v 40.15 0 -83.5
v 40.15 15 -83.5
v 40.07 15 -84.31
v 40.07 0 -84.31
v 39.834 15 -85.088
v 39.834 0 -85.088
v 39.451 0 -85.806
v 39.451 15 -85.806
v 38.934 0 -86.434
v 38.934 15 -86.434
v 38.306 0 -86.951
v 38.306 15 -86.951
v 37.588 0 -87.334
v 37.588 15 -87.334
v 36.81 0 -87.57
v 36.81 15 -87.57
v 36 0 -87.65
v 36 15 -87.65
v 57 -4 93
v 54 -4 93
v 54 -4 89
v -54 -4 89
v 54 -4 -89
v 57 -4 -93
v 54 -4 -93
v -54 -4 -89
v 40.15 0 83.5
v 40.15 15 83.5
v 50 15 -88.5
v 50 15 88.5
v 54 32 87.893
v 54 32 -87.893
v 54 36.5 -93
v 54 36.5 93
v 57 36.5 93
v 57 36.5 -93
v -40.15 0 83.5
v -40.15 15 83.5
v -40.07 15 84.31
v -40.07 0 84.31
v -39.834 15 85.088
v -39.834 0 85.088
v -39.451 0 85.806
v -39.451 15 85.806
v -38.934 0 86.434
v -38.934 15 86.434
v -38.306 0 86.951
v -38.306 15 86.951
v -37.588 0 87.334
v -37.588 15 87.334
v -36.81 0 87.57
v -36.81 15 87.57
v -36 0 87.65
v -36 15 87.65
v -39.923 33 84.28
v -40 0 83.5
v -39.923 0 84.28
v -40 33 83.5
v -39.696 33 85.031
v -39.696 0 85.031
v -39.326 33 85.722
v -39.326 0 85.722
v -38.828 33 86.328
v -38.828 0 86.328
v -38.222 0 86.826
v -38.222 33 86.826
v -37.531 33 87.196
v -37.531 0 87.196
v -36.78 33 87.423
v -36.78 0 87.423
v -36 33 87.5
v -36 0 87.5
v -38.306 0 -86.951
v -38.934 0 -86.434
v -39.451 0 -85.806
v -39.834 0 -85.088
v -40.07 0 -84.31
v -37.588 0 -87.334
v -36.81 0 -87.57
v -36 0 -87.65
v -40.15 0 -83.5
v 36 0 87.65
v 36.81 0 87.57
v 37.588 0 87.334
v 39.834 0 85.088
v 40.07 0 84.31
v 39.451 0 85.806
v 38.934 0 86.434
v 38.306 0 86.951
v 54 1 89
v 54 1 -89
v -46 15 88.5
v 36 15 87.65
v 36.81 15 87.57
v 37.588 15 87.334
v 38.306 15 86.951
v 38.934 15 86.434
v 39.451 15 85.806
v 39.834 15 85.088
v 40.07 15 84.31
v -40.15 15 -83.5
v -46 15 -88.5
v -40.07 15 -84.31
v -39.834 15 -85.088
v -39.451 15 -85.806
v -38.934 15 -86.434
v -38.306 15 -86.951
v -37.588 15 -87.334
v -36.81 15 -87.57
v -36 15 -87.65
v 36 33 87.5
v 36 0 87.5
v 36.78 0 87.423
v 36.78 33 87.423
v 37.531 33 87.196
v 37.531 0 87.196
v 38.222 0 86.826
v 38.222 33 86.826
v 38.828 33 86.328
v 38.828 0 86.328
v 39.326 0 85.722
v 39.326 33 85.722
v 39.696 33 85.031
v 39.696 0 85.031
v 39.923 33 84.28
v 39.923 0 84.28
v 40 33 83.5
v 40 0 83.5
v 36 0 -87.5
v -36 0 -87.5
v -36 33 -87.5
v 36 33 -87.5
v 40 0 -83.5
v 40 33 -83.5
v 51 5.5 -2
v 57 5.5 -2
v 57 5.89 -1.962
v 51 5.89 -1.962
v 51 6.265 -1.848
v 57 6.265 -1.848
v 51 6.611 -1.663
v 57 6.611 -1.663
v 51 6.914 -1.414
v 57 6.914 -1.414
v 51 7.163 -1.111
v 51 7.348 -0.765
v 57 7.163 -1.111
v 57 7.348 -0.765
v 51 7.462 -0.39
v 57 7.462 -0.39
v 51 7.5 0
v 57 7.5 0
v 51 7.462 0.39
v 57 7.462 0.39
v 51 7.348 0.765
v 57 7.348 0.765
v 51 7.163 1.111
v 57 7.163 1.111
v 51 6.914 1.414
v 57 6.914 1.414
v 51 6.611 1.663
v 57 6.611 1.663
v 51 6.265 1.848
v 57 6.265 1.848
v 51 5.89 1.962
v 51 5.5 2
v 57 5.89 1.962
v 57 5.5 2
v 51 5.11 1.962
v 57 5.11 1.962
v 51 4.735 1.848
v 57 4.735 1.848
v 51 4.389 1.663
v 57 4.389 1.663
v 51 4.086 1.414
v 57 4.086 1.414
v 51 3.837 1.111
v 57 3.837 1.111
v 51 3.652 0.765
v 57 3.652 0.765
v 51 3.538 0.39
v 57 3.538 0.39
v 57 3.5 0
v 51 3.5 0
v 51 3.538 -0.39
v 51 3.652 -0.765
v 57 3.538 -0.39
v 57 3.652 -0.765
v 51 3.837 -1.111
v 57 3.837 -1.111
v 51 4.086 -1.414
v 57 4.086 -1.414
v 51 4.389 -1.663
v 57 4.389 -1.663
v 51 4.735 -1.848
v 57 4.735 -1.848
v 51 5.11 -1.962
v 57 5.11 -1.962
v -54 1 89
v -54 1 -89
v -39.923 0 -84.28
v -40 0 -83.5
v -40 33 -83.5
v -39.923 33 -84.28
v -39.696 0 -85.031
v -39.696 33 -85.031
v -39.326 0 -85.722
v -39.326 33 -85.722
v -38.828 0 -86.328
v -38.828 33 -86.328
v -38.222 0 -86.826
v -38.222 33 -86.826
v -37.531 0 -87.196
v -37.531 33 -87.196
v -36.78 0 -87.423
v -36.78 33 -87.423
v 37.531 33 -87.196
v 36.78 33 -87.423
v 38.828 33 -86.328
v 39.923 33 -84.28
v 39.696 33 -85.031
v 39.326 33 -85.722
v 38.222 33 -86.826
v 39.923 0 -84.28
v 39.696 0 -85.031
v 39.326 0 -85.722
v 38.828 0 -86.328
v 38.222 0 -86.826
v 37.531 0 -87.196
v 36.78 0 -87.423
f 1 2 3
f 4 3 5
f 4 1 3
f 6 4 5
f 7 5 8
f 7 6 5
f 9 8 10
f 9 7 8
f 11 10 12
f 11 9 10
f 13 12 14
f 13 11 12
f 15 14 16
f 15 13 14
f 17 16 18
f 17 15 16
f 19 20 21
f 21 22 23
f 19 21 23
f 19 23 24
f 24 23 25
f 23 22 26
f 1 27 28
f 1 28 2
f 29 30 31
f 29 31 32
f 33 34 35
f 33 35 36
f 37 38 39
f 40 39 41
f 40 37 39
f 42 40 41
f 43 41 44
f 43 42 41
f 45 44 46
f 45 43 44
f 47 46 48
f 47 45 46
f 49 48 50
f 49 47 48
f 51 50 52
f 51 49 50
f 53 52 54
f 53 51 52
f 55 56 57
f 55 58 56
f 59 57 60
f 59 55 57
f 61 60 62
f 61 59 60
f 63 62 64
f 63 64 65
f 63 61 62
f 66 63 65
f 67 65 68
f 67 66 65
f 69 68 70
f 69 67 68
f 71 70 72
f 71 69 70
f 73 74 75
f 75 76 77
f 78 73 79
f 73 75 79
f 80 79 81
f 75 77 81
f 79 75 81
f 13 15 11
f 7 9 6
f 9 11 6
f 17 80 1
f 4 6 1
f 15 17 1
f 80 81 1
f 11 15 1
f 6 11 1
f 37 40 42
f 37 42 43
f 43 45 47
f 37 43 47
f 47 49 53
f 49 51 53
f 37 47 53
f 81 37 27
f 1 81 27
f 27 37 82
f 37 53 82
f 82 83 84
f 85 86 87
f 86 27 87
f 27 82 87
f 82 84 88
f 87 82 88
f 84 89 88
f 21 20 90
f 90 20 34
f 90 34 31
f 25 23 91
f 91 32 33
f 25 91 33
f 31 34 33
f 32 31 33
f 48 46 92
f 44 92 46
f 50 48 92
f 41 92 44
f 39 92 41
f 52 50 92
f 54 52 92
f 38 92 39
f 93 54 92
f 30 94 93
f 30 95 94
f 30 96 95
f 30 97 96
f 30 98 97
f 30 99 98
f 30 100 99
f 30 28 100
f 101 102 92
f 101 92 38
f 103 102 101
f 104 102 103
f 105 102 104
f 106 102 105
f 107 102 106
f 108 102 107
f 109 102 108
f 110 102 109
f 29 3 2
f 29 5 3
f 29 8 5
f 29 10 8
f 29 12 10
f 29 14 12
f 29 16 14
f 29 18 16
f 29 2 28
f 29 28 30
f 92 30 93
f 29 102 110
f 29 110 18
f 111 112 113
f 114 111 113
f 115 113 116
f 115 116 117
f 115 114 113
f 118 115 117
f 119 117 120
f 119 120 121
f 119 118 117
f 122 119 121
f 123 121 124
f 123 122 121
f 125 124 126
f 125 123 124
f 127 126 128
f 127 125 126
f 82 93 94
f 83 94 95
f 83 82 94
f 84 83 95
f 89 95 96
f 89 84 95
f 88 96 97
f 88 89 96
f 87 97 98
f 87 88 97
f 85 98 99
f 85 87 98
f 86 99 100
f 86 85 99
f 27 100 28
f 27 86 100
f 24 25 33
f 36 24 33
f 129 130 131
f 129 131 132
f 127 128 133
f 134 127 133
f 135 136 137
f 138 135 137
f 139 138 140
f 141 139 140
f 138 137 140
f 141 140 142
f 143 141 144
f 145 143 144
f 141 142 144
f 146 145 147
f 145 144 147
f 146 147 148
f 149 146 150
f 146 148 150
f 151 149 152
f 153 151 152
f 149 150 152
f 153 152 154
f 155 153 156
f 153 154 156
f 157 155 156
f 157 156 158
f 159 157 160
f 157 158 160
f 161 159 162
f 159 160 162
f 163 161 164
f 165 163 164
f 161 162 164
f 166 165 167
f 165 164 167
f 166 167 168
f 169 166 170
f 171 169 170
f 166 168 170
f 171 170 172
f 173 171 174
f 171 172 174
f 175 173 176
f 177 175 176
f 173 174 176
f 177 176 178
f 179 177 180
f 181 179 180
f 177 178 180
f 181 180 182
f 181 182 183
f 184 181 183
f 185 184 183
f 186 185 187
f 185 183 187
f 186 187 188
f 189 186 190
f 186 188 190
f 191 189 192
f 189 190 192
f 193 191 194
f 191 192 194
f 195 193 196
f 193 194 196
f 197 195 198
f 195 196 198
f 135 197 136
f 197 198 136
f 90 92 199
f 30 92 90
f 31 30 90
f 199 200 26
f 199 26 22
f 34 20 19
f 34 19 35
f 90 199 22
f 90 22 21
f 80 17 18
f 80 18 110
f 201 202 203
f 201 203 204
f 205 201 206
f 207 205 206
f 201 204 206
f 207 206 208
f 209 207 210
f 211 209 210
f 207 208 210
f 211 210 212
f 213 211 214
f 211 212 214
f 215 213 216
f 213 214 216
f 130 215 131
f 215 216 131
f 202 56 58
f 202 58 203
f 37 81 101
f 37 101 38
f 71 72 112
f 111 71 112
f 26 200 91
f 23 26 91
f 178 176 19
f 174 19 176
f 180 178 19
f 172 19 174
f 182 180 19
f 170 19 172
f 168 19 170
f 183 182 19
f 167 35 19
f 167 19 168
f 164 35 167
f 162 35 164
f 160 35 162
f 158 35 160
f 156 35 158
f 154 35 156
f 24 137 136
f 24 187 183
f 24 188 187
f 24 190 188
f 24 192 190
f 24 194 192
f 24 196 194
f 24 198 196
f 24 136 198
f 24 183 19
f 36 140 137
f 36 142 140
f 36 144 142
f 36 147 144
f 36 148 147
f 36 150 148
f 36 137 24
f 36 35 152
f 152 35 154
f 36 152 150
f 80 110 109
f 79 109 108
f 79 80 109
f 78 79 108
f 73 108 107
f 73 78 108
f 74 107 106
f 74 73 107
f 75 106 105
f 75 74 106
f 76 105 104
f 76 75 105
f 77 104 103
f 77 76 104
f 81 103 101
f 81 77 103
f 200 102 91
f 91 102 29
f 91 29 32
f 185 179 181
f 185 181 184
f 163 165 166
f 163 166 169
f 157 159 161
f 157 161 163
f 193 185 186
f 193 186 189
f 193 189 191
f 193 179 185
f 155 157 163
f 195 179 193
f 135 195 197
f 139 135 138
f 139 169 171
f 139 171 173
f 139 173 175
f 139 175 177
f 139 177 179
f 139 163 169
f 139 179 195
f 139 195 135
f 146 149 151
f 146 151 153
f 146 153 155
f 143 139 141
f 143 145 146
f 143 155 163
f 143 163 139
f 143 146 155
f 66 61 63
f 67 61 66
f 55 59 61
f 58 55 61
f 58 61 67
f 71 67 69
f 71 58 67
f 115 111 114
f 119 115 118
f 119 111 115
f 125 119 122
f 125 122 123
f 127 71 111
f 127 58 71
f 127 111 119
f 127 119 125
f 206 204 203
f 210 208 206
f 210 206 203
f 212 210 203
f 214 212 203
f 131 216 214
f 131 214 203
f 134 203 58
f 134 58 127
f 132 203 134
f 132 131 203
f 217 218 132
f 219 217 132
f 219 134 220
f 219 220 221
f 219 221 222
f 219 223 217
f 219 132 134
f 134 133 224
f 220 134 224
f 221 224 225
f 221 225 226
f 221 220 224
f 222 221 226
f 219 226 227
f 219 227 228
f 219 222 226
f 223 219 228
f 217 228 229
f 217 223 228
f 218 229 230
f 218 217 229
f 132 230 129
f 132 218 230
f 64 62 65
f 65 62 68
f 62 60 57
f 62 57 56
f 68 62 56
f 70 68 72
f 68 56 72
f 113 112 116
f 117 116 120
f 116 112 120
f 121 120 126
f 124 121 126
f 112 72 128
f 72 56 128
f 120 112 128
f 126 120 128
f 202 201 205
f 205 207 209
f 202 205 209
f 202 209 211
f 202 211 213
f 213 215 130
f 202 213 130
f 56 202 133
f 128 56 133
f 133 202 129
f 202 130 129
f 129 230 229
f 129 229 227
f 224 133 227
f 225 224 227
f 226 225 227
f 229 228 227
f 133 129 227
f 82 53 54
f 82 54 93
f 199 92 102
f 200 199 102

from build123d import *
from OCP.BRepFilletAPI import BRepFilletAPI_MakeChamfer

# Parameters (mm, degrees)
SKETCH1_W           = 80
SKETCH1_H           = 175
BOSS_EXTRUDE1_DEPTH = 33
FILLET1_R           = 4
SKETCH2_W           = 108
SKETCH2_H           = 178
BOSS_EXTRUDE2_DEPTH = 15
SKETCH3_W           = 108
SKETCH3_H           = 178
BOSS_EXTRUDE3_DEPTH = 4
CHAMFER1_SIZE       = 14
CHAMFER1_SIZE2      = 0.5
CHAMFER2_SIZE       = 14
CHAMFER2_SIZE2      = 8
SKETCH8_W           = 186
SKETCH8_H           = 40.5
BOSS_EXTRUDE4_DEPTH = 3
SKETCH9_R           = 2
CUT_EXTRUDE1_DEPTH  = 6
CHAMFER4_SIZE       = 17
CHAMFER4_SIZE2      = 4


with BuildPart() as part:
    # Sketch1 → Boss-Extrude1 (new body)
    with BuildSketch(Plane(origin=(0, 0, 0), x_dir=(1, 0, 0), z_dir=(0, 1, 0))):
        Rectangle(SKETCH1_W, SKETCH1_H)
    extrude(amount=BOSS_EXTRUDE1_DEPTH)

    # Fillet1
    fillet1_edges = [part.edges().sort_by_distance(p)[0] for p in [
        (40, 16.5, 87.5),
        (-40, 16.5, 87.5),
        (-40, 16.5, -87.5),
        (40, 16.5, -87.5),
    ]]
    fillet(fillet1_edges, radius=FILLET1_R)


with BuildPart() as body_2:
    # Sketch2 → Boss-Extrude2 (new body)
    with BuildSketch(Plane(origin=(0, 0, 0), x_dir=(1, 0, 0), z_dir=(0, 1, 0))):
        Rectangle(SKETCH2_W, SKETCH2_H)
        with BuildLine():
            Line((36, 87.65), (-36, 87.65))
            ThreePointArc((-36, 87.65), (-38.934493142, 86.434493142), (-40.15, 83.5))
            Line((-40.15, 83.5), (-40.15, -83.5))
            ThreePointArc((-40.15, -83.5), (-38.934493142, -86.434493142), (-36, -87.65))
            Line((-36, -87.65), (36, -87.65))
            ThreePointArc((36, -87.65), (38.934493142, -86.434493142), (40.15, -83.5))
            Line((40.15, -83.5), (40.15, 83.5))
            ThreePointArc((40.15, 83.5), (38.934493142, 86.434493142), (36, 87.65))
        make_face(mode=Mode.SUBTRACT)
    extrude(amount=BOSS_EXTRUDE2_DEPTH)

    # Sketch3 → Boss-Extrude3 (add)
    with BuildSketch(Plane.XZ):
        Rectangle(SKETCH3_W, SKETCH3_H)
    extrude(amount=BOSS_EXTRUDE3_DEPTH)

    # Chamfer1: one chamfer whose edges measure the first distance from different faces: ONE call of the kernel's chamfer builder (chamfer() names one face for all edges)
    chamfer1_edges_1 = [body_2.edges().sort_by_distance(p)[0] for p in [
        (0, 15, 89),
    ]]
    chamfer1_side_1 = [body_2.faces().sort_by_distance(p)[0] for p in [
        (0, 5.5, 89),
    ]]
    chamfer1_edges_2 = [body_2.edges().sort_by_distance(p)[0] for p in [
        (0, 15, -89),
    ]]
    chamfer1_side_2 = [body_2.faces().sort_by_distance(p)[0] for p in [
        (0, 5.5, -89),
    ]]
    chamfer1 = BRepFilletAPI_MakeChamfer(body_2.part.solid().wrapped)
    for e in chamfer1_edges_1:
        chamfer1.Add(CHAMFER1_SIZE, CHAMFER1_SIZE2, e.wrapped, chamfer1_side_1[0].wrapped)  # the first distance lies on this face
    for e in chamfer1_edges_2:
        chamfer1.Add(CHAMFER1_SIZE, CHAMFER1_SIZE2, e.wrapped, chamfer1_side_2[0].wrapped)  # the first distance lies on this face
    add(Compound.cast(chamfer1.Shape()), mode=Mode.REPLACE)

    # Chamfer2
    chamfer2_edges = [body_2.edges().sort_by_distance(p)[0] for p in [
        (-54, 15, 0),
    ]]
    chamfer2_side = [body_2.faces().sort_by_distance(p)[0] for p in [
        (-54, 5.489975309, 0),
    ]]
    chamfer(chamfer2_edges, length=CHAMFER2_SIZE, length2=CHAMFER2_SIZE2, reference=chamfer2_side[0])

    # Sketch8 → Boss-Extrude4 (add)
    with BuildSketch(Plane(origin=(54, 0, 0), x_dir=(0, 0, -1), z_dir=(1, 0, 0))):
        with Locations((0, 16.25)):
            Rectangle(SKETCH8_W, SKETCH8_H)
    extrude(amount=BOSS_EXTRUDE4_DEPTH)

    # Sketch9 → Cut-Extrude1 (cut)
    with BuildSketch(Plane(origin=(57, 0, 0), x_dir=(0, 0, -1), z_dir=(1, 0, 0))):
        with Locations((0, 5.5)):
            Circle(SKETCH9_R)
    extrude(amount=-CUT_EXTRUDE1_DEPTH, mode=Mode.SUBTRACT)

    # Chamfer4
    chamfer4_edges = [body_2.edges().sort_by_distance(p)[0] for p in [
        (54, 15, 0),
    ]]
    chamfer4_side = [body_2.faces().sort_by_distance(p)[0] for p in [
        (54, 24.983786275, 0),
    ]]
    chamfer(chamfer4_edges, length=CHAMFER4_SIZE, length2=CHAMFER4_SIZE2, reference=chamfer4_side[0])


solid = Compound([part.part, body_2.part])
